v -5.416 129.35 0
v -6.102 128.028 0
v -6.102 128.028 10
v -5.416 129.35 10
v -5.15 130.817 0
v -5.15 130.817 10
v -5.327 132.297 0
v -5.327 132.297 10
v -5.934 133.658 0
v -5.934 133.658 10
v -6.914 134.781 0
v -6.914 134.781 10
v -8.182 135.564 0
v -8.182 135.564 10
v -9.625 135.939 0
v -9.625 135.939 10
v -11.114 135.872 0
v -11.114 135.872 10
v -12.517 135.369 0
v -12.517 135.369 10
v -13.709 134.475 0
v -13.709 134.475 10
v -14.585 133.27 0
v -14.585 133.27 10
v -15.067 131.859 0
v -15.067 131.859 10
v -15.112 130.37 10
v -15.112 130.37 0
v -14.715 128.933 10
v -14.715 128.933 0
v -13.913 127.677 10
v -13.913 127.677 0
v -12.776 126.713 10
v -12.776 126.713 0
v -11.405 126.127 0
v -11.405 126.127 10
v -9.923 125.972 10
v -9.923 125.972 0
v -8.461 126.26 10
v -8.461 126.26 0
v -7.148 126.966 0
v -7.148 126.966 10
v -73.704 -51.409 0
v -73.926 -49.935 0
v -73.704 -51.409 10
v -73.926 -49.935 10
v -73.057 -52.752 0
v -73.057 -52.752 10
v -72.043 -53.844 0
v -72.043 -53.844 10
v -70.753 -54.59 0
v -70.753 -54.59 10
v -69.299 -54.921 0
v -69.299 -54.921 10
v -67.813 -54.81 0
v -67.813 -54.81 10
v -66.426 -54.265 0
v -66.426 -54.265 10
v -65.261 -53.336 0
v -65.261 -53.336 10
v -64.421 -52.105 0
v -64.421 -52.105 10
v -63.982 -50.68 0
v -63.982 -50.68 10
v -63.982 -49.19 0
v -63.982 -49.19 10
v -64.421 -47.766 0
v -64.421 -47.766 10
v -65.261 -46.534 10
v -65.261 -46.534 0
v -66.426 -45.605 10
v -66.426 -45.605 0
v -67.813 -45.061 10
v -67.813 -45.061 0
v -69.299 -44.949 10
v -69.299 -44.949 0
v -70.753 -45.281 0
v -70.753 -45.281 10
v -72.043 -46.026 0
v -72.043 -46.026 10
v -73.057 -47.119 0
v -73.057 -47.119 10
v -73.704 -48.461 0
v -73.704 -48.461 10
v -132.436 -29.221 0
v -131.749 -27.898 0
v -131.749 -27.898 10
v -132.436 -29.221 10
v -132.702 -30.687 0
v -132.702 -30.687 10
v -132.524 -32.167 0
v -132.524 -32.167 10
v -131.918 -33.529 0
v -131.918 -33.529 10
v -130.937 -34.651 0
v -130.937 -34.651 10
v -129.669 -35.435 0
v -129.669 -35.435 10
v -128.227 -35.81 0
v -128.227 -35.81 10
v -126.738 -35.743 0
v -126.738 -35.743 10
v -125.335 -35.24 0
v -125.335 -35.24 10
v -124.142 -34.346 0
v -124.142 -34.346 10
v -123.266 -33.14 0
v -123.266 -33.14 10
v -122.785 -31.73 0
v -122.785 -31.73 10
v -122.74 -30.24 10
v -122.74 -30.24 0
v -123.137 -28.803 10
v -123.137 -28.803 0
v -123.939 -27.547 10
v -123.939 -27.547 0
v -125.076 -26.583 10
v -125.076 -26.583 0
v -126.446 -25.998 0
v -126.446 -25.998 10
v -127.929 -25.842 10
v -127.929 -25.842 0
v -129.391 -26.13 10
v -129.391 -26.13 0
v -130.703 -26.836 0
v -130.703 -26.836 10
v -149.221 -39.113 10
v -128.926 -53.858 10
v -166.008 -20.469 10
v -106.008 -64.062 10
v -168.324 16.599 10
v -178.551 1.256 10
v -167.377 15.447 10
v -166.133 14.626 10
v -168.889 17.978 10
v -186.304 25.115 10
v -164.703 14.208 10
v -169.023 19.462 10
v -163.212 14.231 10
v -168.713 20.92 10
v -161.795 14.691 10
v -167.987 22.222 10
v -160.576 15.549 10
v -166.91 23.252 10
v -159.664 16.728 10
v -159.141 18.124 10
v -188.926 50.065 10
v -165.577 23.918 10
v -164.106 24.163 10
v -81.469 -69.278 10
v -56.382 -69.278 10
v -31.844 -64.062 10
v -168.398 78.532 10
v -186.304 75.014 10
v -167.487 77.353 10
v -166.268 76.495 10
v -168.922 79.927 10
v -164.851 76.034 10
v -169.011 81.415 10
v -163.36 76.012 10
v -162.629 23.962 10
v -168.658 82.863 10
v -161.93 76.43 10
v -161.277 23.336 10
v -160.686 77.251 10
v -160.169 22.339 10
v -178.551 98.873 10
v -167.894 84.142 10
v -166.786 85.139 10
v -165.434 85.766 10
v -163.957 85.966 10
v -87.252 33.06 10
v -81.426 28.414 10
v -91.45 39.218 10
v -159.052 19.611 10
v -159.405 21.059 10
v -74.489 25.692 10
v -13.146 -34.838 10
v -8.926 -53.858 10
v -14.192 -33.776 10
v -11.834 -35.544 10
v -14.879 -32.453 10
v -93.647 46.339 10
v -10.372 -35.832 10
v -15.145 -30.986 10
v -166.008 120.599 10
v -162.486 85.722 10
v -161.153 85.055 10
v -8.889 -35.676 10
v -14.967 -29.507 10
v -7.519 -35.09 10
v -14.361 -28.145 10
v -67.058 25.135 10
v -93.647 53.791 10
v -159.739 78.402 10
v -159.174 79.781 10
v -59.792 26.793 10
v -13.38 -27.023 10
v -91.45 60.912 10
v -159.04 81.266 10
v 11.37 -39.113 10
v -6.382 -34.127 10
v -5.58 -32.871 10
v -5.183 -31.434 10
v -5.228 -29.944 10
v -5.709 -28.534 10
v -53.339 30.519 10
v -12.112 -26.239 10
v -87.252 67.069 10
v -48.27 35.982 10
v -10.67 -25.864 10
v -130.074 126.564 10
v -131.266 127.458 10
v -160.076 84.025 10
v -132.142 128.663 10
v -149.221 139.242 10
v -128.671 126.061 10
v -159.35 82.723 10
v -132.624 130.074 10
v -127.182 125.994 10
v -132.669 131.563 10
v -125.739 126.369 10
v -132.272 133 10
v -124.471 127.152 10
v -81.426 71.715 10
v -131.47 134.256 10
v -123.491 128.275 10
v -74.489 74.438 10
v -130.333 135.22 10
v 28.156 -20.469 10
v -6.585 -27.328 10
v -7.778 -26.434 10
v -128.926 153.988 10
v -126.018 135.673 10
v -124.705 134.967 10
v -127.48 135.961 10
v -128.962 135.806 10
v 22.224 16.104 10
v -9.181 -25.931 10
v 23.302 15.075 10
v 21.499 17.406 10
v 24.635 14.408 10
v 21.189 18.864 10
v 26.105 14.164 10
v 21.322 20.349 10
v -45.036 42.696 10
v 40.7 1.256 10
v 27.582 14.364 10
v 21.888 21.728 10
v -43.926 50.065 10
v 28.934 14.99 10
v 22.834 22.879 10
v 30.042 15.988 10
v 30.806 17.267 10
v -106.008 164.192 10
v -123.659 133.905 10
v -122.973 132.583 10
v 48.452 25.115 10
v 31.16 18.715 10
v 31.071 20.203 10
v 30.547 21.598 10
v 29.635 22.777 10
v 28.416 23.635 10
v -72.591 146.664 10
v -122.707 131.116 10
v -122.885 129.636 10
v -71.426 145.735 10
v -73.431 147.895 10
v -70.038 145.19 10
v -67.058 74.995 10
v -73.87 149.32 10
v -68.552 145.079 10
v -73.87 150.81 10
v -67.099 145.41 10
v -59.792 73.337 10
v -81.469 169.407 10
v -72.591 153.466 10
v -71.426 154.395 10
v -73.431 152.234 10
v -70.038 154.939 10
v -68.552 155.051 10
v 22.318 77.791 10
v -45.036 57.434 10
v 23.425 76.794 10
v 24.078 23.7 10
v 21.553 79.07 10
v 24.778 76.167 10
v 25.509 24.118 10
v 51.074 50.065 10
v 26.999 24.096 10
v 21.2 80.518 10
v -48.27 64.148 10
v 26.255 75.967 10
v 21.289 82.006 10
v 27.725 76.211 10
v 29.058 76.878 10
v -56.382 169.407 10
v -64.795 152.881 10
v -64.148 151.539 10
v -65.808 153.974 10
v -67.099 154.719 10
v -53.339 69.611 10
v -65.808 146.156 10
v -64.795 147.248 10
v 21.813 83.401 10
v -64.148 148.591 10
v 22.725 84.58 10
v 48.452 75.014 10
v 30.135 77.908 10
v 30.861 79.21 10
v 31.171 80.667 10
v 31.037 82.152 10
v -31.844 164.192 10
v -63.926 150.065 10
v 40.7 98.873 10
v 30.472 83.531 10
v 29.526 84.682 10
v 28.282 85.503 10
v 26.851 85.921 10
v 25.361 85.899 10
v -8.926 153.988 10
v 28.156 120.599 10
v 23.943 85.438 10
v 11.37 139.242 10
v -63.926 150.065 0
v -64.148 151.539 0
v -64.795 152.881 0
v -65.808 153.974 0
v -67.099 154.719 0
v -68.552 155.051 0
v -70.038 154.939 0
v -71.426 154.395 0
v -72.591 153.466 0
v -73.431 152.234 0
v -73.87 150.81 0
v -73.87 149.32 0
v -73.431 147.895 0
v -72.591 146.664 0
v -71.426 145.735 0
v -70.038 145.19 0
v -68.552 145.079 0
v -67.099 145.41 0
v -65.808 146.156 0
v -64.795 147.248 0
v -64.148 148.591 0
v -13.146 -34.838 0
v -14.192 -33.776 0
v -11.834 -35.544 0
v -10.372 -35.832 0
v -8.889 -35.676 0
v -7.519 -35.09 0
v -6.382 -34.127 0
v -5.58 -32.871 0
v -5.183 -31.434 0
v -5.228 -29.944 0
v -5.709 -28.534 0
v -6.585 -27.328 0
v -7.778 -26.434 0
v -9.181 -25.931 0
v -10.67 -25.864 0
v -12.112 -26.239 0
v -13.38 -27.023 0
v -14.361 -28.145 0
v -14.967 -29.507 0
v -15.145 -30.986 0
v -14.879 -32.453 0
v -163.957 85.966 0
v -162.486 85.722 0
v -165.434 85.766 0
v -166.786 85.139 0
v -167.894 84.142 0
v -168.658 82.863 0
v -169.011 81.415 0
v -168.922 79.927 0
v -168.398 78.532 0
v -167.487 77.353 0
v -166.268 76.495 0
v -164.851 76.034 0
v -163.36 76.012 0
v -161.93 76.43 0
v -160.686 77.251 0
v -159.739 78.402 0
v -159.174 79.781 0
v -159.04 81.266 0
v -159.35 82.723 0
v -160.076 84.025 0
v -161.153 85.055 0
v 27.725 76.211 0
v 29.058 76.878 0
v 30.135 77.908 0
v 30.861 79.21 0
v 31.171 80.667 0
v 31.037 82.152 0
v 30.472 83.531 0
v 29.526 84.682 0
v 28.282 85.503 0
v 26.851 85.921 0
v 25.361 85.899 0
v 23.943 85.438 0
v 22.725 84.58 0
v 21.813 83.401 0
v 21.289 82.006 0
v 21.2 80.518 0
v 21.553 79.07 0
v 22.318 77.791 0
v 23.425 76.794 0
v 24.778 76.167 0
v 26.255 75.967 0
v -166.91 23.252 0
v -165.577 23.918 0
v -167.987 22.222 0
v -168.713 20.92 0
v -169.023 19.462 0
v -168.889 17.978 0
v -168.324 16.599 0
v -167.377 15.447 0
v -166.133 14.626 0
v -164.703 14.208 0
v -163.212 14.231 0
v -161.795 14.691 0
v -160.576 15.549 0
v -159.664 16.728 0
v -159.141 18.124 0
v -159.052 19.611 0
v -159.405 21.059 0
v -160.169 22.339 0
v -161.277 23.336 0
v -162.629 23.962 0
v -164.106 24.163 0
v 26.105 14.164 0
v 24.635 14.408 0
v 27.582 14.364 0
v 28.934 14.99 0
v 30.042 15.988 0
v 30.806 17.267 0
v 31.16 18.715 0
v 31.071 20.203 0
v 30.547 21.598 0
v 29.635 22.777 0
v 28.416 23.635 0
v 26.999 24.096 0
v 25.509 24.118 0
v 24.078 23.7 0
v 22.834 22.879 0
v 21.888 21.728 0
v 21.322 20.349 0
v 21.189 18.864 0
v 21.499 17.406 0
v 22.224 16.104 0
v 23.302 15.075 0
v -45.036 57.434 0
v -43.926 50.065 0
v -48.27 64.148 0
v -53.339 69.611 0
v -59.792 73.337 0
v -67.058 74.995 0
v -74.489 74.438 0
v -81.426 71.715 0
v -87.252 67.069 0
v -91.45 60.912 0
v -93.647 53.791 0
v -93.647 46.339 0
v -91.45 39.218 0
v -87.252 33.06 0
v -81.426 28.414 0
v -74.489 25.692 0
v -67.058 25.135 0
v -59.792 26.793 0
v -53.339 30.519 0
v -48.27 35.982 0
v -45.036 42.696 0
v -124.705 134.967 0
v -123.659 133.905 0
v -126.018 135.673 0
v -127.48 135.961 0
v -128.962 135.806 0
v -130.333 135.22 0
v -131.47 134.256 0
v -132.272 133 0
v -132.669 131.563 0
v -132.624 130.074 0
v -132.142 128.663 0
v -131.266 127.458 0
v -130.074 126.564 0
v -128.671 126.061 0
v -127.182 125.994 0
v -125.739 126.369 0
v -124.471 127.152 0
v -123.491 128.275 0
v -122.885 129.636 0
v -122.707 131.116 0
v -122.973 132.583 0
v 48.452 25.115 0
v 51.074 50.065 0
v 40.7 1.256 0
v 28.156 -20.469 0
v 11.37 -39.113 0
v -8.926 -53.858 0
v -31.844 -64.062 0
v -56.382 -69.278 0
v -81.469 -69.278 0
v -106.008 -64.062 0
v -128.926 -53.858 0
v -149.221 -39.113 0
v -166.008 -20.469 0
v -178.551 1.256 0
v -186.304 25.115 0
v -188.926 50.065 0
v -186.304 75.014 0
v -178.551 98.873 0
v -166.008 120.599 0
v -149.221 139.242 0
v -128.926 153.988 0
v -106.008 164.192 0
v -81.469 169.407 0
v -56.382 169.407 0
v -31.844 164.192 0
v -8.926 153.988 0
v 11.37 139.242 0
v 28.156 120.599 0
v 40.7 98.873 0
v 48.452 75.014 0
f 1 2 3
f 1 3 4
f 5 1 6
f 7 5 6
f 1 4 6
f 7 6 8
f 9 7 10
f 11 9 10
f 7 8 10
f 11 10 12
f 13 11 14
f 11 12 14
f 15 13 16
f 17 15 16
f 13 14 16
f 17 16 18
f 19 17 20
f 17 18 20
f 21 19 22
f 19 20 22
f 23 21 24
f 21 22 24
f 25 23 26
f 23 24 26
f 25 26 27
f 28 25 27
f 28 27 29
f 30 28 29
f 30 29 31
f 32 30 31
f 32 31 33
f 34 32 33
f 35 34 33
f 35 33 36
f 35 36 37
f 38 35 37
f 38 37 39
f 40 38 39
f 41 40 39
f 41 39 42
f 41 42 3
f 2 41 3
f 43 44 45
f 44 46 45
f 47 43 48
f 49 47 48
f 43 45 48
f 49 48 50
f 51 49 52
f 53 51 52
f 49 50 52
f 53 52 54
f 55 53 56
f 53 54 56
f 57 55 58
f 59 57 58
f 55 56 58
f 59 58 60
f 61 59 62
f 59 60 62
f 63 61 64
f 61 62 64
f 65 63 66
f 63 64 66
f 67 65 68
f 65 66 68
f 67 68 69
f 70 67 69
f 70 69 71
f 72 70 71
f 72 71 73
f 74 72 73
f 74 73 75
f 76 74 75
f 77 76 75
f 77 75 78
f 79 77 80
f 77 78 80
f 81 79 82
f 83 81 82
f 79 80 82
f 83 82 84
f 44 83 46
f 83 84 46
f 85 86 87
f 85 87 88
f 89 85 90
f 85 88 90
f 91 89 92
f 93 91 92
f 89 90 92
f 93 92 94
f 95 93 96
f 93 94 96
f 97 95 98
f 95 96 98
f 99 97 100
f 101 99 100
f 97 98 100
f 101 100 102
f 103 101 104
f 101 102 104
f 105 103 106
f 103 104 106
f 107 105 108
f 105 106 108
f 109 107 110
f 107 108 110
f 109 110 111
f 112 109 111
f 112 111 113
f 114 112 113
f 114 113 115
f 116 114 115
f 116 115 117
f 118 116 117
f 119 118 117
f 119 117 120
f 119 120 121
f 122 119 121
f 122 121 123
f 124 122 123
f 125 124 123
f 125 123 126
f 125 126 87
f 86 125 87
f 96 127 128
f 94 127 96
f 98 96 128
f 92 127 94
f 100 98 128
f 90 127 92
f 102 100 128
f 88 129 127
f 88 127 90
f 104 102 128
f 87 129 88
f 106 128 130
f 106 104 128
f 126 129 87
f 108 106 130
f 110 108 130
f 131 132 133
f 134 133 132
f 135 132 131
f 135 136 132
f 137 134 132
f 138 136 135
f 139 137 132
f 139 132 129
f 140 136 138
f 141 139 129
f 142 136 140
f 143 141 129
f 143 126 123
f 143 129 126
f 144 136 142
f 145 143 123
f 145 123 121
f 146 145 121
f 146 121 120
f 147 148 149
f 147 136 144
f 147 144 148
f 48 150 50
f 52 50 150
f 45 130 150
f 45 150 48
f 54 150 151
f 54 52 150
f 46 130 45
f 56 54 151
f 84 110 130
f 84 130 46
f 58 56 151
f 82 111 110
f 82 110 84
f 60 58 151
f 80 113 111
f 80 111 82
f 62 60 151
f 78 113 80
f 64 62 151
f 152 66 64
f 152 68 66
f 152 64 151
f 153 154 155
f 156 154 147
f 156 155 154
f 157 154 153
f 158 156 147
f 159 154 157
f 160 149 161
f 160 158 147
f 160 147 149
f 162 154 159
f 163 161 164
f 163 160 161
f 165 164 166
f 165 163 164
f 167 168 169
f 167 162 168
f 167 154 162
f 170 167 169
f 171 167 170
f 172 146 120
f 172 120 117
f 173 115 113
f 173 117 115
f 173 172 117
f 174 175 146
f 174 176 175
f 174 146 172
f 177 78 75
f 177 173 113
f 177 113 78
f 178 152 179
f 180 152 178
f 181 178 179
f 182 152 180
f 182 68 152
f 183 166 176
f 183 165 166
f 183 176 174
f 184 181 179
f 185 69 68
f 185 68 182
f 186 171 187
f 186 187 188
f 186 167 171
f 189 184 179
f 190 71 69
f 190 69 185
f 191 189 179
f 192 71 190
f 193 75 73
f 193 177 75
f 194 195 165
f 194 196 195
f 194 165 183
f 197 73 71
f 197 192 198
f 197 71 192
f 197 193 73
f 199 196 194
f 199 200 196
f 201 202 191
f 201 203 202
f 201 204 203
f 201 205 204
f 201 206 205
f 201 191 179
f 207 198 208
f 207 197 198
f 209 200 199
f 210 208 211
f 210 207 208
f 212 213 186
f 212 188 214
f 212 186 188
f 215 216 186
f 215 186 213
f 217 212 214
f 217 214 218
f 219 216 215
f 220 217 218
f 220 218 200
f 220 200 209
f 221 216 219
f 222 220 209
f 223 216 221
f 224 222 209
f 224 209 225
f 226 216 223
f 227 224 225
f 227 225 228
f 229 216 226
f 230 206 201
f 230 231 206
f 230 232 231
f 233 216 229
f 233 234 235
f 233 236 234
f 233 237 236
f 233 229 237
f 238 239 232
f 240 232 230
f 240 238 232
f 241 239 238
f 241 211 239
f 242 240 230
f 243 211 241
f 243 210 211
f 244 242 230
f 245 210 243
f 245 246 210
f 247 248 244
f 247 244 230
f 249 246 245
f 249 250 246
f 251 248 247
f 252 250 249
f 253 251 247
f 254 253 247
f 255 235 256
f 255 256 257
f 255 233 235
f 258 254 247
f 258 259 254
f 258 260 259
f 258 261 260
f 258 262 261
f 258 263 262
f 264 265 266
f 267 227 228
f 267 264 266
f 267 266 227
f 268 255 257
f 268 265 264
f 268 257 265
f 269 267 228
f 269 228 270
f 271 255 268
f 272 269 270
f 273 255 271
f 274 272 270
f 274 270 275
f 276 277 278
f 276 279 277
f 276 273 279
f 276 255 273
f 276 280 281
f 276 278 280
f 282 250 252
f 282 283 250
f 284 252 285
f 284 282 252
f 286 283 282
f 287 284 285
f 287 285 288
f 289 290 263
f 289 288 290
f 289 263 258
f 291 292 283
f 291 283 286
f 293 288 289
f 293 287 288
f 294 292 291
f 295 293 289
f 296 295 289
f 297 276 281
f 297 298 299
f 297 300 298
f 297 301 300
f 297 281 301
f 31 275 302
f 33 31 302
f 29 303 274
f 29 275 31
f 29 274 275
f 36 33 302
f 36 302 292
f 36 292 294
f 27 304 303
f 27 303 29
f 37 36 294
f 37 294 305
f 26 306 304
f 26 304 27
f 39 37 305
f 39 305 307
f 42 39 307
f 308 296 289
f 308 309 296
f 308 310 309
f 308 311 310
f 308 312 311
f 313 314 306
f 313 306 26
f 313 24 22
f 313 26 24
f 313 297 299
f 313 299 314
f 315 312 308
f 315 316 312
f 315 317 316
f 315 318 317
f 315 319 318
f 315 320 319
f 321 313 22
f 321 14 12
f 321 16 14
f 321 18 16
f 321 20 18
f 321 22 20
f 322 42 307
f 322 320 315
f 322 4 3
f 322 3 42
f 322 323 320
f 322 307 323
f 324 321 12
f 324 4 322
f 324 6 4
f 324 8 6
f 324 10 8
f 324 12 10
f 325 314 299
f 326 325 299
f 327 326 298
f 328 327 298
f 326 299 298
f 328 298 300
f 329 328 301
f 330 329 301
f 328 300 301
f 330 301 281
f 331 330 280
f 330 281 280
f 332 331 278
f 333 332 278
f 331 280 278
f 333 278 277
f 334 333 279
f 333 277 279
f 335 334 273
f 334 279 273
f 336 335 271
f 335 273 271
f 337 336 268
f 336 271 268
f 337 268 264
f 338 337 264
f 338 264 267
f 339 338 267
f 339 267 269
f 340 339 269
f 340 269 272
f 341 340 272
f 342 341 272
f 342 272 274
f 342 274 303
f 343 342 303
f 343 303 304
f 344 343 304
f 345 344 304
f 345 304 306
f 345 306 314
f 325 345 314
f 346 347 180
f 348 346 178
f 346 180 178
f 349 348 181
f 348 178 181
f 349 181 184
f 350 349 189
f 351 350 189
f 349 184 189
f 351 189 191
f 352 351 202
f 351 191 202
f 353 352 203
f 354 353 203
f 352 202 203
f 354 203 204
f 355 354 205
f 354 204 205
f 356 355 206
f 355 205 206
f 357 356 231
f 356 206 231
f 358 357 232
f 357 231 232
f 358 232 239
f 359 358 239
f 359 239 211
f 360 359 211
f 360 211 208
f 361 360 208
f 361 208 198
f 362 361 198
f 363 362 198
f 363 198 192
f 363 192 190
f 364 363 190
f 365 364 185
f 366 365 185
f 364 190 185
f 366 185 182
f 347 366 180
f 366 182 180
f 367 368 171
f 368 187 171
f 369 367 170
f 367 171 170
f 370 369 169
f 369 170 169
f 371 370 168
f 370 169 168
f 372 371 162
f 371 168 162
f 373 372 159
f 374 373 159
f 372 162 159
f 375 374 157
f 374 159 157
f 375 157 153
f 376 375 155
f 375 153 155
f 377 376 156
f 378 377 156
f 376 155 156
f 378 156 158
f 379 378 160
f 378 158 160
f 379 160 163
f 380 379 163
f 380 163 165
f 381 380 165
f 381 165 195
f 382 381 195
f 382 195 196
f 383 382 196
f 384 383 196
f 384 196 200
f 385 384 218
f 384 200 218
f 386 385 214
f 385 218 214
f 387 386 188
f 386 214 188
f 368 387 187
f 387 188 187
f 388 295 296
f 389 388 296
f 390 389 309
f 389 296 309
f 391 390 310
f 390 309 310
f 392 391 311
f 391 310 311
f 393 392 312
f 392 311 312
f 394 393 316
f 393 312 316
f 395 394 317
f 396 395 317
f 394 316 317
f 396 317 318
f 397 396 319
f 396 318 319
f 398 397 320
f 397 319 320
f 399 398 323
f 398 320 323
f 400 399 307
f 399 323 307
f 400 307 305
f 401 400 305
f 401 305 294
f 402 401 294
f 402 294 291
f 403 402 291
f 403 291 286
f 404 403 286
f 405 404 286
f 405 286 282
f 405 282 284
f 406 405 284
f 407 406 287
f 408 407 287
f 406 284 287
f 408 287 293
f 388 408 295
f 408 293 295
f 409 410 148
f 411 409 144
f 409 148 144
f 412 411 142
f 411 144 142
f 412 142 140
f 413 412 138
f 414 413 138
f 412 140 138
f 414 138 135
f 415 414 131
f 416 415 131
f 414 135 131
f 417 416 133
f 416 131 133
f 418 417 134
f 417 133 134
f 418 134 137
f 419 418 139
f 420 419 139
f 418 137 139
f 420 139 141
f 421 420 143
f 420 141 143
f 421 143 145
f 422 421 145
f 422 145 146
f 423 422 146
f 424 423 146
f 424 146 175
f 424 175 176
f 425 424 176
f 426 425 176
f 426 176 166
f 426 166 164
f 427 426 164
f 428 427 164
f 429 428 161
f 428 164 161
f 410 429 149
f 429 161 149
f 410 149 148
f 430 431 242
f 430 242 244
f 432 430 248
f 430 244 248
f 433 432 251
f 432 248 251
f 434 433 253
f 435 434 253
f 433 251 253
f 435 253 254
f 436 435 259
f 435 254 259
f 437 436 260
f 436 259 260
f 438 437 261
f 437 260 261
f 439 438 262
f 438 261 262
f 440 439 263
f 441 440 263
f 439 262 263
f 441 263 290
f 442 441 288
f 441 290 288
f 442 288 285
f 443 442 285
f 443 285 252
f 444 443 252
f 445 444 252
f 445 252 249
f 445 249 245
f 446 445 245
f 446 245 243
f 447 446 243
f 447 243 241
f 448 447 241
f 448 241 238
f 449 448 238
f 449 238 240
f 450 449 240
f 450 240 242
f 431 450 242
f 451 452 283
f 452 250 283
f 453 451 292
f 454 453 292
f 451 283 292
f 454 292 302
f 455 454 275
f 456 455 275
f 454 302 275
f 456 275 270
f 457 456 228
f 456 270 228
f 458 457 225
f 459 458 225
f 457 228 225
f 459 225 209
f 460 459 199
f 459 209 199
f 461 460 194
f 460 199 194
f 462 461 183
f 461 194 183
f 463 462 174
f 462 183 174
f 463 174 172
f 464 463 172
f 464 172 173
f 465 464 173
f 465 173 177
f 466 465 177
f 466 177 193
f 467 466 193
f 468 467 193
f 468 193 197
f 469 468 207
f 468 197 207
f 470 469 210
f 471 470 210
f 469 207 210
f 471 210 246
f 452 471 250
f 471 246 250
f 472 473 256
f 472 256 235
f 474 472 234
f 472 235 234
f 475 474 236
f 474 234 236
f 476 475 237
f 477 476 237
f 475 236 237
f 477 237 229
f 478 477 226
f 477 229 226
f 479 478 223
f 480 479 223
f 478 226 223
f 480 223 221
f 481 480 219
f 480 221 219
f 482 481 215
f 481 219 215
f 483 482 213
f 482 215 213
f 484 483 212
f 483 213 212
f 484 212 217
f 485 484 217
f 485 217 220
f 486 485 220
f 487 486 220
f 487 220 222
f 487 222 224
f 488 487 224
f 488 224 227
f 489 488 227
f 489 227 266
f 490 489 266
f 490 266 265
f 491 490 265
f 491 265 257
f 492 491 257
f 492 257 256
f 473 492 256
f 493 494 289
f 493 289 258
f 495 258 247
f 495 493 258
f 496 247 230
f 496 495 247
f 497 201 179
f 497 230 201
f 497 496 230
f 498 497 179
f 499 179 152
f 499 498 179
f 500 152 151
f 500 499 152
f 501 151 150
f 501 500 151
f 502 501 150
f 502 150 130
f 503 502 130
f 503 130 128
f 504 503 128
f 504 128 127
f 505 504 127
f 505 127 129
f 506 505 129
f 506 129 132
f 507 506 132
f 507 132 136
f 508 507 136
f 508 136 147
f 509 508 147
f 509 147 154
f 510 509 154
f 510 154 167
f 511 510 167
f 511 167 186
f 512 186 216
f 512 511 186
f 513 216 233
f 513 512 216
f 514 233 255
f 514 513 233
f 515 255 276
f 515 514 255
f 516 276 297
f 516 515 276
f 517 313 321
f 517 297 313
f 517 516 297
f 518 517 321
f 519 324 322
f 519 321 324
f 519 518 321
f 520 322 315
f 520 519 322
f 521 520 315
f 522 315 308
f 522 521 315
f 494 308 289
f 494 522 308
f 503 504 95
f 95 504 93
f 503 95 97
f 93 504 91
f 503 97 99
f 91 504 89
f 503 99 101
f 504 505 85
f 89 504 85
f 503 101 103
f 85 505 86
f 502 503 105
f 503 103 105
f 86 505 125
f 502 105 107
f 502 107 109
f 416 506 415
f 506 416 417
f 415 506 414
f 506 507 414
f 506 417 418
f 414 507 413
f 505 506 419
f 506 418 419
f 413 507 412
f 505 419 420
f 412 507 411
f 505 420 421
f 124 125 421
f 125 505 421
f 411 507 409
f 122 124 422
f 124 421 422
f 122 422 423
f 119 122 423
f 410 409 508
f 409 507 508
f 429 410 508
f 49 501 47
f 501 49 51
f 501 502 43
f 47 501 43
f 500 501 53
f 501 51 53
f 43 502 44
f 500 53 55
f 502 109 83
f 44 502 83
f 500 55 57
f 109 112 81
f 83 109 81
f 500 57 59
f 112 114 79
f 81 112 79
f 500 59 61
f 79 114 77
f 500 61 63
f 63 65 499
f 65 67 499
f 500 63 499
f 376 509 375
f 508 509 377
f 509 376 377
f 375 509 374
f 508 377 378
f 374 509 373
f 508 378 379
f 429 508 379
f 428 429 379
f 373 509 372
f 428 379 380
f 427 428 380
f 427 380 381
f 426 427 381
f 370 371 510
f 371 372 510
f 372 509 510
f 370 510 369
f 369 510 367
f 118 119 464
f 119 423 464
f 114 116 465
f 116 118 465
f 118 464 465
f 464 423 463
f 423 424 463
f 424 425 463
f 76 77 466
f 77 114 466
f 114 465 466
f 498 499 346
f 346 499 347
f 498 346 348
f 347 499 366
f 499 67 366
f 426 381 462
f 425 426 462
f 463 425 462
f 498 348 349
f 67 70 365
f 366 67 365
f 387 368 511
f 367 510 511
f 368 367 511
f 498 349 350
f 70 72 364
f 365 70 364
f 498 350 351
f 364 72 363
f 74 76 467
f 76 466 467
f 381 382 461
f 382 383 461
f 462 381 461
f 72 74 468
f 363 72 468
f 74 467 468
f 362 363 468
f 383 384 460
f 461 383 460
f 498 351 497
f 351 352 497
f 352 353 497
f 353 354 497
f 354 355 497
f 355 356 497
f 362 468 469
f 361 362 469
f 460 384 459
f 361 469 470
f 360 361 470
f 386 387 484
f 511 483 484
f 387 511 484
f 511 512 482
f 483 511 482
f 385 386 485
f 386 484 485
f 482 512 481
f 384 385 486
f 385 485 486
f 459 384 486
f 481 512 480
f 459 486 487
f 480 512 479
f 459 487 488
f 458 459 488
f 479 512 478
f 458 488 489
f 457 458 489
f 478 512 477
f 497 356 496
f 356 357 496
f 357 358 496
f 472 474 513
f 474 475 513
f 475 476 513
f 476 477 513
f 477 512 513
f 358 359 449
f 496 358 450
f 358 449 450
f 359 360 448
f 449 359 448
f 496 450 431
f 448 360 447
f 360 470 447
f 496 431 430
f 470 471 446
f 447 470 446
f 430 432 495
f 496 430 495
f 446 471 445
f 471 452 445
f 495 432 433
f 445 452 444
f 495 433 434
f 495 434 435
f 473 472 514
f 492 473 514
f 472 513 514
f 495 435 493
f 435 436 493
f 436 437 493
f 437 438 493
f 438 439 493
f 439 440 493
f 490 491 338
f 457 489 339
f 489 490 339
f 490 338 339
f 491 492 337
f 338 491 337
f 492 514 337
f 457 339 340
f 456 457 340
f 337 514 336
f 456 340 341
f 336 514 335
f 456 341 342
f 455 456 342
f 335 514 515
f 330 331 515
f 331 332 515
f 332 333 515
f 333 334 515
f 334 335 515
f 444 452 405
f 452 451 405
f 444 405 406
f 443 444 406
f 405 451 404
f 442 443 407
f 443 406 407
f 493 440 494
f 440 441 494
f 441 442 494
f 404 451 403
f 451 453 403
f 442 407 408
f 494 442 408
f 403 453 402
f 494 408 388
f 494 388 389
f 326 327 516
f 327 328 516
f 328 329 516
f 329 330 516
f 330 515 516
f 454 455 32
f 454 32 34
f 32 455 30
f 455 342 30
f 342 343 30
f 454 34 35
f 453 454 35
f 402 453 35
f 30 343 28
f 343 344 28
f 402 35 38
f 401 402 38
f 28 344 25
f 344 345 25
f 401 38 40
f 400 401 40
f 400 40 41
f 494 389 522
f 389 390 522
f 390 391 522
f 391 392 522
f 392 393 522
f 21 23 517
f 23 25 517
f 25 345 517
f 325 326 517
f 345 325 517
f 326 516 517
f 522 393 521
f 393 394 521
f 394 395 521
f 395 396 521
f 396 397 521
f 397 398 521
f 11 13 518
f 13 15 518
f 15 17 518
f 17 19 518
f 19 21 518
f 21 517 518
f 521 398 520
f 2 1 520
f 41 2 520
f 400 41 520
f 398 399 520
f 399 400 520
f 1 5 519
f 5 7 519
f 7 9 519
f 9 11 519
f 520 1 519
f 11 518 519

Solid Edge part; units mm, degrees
sketch "Sketch1" plane through (0, 0, 0) normal (0, 0, 1) x (1, 0, 0)
  circle A0 centre (-68.9258, 50.0648) radius 120
  dimension "D1" = 240
extrude "Protrusion1" add sketch "Sketch1" along normal blind 10
sketch "Sketch2" plane through (-68.9258, 50.0648, 10) normal (0, 0, 1) x (1, 0, 0)
  circle A0 centre (0, 100) radius 5
  dimension "D1" = 10
  dimension "D2" = 20
extrude "Cutout1" cut sketch "Sketch2" against normal through all
pattern_circular "Pattern1" count 10 over 360 about axis through (-68.9258, 50.0648, 10) along (0, 0, -1) of "Cutout1"
sketch "Sketch3" plane through (-68.9258, 50.0648, 10) normal (0, 0, 1) x (1, 0, 0)
  circle A0 centre (0, 0) radius 25
  dimension "D1" = 50
extrude "Cutout2" cut sketch "Sketch3" against normal through all
